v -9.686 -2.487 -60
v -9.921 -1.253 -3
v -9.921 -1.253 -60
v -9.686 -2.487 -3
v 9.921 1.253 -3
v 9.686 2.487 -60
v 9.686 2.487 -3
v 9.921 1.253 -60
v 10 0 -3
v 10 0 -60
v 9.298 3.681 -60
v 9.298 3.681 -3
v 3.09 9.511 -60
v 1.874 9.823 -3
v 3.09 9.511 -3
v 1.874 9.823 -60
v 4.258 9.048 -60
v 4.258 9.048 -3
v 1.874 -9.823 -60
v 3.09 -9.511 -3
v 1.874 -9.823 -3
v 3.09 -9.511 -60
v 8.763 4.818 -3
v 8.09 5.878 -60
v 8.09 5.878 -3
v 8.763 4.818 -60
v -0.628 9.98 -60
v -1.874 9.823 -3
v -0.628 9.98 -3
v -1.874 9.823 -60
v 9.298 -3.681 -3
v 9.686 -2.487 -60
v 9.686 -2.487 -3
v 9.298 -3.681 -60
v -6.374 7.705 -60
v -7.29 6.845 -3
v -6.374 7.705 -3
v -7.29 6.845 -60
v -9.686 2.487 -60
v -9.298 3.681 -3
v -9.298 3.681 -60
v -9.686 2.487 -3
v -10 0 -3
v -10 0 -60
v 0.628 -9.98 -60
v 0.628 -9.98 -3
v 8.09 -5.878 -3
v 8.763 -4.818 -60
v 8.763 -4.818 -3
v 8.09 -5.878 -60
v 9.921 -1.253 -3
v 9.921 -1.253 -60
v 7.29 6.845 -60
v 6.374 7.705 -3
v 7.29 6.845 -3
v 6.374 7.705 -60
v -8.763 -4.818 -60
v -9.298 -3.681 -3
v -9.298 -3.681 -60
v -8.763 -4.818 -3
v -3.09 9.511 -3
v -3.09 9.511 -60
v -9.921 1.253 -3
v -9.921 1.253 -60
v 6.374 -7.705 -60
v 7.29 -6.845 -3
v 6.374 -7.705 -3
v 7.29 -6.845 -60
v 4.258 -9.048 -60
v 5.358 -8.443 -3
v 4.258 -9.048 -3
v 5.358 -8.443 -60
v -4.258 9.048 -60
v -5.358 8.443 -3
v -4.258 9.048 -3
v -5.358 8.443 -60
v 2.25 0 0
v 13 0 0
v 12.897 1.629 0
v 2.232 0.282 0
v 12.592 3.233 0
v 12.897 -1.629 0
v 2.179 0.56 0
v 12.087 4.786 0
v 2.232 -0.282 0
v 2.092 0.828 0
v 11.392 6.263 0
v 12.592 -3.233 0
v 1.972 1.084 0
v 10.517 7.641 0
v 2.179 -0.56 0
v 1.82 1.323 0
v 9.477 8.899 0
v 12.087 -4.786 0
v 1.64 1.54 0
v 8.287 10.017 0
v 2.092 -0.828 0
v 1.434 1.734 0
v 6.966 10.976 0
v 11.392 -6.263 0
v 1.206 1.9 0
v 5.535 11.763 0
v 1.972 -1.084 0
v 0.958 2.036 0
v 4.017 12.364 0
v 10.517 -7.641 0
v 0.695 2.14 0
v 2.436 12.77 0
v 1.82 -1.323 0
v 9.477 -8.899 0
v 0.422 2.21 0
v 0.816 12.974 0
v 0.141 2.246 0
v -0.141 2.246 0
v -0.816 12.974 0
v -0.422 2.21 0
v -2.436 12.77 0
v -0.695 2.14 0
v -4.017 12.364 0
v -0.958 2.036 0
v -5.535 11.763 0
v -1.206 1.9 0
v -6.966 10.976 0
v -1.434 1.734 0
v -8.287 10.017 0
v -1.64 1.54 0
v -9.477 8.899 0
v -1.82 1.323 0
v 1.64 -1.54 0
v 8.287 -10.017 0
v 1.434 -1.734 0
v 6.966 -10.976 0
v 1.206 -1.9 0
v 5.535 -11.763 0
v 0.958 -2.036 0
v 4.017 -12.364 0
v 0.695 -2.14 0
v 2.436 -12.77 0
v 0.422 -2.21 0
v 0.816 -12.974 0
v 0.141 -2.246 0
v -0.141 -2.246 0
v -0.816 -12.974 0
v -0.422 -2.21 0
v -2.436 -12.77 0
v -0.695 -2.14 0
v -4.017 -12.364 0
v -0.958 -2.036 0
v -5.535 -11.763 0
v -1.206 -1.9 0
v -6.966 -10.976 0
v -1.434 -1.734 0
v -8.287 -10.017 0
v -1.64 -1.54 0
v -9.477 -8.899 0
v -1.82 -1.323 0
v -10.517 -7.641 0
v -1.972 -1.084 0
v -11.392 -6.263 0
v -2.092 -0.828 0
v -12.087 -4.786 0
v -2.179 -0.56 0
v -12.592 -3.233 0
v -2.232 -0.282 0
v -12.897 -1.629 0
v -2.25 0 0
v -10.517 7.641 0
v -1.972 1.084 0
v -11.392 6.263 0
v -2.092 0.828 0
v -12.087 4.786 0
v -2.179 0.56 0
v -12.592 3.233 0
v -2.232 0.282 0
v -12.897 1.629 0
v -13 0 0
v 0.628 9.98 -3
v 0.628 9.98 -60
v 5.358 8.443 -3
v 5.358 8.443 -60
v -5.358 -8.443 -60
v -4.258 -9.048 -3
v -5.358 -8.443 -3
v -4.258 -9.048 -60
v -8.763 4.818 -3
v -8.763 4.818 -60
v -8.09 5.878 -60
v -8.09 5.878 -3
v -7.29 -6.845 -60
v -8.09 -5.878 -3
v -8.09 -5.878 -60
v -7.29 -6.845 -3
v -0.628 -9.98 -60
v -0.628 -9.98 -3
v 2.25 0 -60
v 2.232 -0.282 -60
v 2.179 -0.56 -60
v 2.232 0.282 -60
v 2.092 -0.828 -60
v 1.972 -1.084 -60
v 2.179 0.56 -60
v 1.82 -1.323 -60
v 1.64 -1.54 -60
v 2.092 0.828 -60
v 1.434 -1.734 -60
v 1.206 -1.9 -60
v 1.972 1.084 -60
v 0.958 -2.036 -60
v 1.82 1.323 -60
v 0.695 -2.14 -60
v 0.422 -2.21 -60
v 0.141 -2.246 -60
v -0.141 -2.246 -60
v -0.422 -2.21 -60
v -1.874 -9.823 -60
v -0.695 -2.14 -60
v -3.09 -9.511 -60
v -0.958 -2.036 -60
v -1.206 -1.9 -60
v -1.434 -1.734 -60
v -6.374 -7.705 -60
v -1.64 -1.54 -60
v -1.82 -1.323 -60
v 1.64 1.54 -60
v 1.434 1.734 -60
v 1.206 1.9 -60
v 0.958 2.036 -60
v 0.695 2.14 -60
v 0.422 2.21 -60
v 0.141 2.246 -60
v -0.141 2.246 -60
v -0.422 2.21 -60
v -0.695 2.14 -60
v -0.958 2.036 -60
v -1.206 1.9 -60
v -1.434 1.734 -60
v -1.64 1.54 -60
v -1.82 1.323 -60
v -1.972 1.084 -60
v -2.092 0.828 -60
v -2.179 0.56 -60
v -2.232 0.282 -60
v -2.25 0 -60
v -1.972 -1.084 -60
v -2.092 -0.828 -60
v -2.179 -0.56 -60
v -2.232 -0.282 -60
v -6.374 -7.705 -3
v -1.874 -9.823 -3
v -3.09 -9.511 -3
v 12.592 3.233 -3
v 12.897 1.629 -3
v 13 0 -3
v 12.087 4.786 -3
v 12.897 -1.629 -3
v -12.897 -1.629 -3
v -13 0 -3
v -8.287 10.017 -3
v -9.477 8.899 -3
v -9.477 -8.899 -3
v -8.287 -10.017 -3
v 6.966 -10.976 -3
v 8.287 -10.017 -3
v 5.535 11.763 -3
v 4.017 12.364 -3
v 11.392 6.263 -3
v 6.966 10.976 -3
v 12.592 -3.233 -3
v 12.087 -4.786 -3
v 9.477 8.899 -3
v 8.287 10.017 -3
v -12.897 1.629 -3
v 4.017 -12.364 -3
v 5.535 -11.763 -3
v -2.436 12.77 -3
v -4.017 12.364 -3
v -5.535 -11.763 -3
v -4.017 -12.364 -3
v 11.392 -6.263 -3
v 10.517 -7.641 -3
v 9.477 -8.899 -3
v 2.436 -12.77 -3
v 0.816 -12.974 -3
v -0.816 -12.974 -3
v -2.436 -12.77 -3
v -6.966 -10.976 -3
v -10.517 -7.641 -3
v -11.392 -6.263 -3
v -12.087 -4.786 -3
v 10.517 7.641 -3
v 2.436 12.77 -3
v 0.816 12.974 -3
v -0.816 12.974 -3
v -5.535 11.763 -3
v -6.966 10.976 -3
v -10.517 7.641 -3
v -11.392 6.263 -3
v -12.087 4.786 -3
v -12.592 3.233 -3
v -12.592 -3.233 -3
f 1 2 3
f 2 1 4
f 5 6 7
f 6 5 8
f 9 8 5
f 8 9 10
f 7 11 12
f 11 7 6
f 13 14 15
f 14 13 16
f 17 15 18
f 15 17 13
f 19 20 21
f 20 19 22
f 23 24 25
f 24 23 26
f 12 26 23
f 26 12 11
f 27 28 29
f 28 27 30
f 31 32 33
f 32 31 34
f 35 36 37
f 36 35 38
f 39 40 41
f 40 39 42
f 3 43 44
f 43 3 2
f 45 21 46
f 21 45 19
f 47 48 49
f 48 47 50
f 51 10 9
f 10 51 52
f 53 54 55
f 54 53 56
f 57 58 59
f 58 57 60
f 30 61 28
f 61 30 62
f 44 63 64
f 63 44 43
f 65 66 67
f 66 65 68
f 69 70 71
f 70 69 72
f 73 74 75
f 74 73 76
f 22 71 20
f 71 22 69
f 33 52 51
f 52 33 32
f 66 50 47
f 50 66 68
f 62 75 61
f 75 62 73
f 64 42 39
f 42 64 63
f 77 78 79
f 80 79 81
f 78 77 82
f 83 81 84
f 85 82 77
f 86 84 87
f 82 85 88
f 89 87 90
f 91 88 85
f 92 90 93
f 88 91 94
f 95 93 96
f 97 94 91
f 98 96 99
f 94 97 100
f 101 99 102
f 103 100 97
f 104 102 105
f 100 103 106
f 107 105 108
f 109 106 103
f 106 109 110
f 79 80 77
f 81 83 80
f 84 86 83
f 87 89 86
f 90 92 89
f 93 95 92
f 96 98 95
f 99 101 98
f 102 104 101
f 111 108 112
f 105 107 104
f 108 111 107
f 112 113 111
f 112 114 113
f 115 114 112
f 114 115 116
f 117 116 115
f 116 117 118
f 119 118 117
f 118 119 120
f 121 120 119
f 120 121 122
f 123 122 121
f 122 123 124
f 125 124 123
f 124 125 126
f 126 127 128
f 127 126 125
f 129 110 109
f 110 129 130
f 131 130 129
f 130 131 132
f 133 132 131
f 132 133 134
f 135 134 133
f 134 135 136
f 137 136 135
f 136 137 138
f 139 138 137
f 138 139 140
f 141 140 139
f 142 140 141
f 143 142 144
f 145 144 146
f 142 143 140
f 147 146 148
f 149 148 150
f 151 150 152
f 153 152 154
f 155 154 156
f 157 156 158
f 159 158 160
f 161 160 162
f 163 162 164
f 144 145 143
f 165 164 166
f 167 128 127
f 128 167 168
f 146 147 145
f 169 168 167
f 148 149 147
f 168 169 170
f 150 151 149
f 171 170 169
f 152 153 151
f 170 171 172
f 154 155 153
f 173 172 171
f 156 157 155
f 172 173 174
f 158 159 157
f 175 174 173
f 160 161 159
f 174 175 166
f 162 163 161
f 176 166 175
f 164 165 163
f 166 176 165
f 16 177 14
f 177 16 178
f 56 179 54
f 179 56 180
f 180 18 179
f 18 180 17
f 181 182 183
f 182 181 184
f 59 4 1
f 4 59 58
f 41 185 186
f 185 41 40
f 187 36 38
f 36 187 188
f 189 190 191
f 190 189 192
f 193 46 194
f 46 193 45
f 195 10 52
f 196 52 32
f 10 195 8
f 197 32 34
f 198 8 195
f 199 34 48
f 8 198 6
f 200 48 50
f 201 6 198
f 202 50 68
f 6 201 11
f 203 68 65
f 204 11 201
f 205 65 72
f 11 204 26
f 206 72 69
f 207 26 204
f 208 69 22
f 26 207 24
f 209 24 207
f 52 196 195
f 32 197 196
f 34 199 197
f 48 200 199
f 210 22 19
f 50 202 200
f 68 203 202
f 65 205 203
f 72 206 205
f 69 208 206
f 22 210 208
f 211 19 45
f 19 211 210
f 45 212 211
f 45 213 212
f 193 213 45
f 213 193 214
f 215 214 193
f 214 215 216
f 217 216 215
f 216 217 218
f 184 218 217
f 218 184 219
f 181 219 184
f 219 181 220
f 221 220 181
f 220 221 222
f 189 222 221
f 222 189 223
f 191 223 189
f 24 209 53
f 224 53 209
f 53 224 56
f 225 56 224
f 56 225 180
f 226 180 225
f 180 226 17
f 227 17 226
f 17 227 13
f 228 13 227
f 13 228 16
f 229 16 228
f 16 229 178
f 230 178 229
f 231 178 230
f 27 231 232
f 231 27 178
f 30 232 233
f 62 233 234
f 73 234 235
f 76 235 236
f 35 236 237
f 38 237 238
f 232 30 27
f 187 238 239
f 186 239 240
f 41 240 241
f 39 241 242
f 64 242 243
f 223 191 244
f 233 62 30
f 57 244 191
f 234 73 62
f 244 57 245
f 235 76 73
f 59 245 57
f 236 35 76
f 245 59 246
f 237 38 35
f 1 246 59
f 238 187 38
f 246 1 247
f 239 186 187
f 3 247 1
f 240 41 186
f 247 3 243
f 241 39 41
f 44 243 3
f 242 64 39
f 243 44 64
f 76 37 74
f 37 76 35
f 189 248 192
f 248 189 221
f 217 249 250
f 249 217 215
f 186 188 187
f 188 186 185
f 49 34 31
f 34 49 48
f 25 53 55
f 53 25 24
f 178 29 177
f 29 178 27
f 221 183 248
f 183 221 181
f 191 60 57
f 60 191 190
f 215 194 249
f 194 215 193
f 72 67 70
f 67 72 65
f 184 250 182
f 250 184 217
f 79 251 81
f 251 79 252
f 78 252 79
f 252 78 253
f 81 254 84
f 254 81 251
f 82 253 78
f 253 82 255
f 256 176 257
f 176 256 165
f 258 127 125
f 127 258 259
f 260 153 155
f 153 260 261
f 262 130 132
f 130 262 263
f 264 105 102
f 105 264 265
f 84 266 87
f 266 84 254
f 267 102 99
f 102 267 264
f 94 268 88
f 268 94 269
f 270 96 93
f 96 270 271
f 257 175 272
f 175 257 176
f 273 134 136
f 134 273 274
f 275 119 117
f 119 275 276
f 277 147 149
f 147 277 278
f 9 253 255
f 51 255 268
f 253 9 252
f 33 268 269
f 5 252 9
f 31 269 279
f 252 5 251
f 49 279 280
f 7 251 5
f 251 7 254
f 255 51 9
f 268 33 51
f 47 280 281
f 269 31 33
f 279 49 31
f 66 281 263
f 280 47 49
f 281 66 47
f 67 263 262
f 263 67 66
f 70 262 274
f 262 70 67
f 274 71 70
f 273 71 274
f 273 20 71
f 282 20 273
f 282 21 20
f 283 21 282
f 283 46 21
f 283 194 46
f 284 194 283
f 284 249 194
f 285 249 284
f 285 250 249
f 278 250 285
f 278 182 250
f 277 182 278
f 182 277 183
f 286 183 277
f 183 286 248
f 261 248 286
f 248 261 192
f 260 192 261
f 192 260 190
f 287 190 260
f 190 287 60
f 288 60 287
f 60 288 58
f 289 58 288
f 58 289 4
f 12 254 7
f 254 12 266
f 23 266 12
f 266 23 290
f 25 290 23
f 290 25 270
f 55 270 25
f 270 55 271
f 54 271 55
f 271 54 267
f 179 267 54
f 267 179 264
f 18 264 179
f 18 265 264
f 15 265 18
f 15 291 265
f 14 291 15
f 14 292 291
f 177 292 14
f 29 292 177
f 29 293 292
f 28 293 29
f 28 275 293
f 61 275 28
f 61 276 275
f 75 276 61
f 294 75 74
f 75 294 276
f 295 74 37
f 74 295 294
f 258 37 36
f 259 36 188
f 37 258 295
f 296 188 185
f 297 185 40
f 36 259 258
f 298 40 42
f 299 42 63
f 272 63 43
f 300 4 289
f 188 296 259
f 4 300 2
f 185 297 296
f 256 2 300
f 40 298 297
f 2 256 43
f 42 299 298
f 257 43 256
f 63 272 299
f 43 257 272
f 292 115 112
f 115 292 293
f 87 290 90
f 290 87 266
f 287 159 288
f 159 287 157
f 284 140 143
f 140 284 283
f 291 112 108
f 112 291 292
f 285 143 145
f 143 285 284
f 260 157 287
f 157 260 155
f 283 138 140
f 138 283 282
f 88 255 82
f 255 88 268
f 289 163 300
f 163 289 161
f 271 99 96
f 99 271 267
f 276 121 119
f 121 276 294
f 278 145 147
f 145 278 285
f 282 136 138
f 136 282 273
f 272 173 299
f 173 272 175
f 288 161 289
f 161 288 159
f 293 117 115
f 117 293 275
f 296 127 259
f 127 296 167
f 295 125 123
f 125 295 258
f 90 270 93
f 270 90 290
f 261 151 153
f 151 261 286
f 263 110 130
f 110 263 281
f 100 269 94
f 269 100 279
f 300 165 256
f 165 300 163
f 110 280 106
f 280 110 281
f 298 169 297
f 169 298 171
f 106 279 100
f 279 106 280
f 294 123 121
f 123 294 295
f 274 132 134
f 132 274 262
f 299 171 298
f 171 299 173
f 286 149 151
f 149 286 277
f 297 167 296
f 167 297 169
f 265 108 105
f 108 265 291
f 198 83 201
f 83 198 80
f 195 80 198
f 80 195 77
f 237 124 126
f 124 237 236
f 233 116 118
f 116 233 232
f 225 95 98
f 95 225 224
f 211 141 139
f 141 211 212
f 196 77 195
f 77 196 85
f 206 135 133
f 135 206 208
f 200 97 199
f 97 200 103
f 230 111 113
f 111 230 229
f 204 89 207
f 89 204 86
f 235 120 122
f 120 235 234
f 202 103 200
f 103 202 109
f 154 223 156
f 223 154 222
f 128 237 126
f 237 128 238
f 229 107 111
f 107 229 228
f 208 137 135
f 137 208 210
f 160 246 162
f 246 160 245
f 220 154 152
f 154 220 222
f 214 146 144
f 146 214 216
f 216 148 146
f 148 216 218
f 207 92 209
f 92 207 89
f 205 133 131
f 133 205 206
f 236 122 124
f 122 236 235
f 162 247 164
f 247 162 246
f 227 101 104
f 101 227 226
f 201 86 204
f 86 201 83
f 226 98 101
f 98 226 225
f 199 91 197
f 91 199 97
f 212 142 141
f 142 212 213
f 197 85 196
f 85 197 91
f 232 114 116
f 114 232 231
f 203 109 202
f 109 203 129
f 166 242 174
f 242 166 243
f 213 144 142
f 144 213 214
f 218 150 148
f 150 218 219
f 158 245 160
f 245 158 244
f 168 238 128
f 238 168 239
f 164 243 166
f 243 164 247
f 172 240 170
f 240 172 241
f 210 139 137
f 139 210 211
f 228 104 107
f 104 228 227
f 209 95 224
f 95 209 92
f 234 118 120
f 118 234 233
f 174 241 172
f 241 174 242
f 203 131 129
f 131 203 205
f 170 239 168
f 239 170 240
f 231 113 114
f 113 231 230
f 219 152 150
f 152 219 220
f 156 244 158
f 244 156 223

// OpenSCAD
$fn = 50;


difference() {
	union() {
		translate(v = [0, 0, -60.0000000000]) {
			cylinder(h = 60, r = 10.0000000000);
		}
		translate(v = [0, 0, -3.0000000000]) {
			cylinder(h = 3, r = 13.0000000000);
		}
	}
	union() {
		#translate(v = [0, 0, -60]) {
			cylinder(h = 60, r = 2.2500000000);
		}
	}
}
